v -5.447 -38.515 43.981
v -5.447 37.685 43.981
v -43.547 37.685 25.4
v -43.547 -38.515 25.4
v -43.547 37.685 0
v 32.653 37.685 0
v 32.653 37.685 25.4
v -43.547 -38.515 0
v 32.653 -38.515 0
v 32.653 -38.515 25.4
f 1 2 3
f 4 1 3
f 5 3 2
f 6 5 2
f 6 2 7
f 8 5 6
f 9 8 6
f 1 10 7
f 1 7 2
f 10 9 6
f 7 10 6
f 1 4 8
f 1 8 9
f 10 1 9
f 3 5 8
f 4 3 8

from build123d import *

# Parameters (mm, degrees)
F0_W     = 76.2
F0_H     = 37.6850995183
F0_H_2   = 38.5149004817
F1_DEPTH = 25.4
F3_DEPTH = 76.2


with BuildPart() as f1:
    # F0 (on Top) → F1 (new body)
    with BuildSketch(Plane.XY):
        with Locations((-5.4470213876, 18.8425497591)):
            Rectangle(F0_W, F0_H)
        with Locations((-5.4470213876, -19.2574502409)):
            Rectangle(F0_W, F0_H_2)
    extrude(amount=F1_DEPTH)

    # F2 (on face) → F3 (join)
    with BuildSketch(Plane.XZ.offset(38.5149004817)):
        Polygon((-43.5470213876, 25.4), (32.6529786124, 25.4), (-5.4470213876, 43.9809113741), align=None)
    extrude(amount=-F3_DEPTH)


solid = f1.part
